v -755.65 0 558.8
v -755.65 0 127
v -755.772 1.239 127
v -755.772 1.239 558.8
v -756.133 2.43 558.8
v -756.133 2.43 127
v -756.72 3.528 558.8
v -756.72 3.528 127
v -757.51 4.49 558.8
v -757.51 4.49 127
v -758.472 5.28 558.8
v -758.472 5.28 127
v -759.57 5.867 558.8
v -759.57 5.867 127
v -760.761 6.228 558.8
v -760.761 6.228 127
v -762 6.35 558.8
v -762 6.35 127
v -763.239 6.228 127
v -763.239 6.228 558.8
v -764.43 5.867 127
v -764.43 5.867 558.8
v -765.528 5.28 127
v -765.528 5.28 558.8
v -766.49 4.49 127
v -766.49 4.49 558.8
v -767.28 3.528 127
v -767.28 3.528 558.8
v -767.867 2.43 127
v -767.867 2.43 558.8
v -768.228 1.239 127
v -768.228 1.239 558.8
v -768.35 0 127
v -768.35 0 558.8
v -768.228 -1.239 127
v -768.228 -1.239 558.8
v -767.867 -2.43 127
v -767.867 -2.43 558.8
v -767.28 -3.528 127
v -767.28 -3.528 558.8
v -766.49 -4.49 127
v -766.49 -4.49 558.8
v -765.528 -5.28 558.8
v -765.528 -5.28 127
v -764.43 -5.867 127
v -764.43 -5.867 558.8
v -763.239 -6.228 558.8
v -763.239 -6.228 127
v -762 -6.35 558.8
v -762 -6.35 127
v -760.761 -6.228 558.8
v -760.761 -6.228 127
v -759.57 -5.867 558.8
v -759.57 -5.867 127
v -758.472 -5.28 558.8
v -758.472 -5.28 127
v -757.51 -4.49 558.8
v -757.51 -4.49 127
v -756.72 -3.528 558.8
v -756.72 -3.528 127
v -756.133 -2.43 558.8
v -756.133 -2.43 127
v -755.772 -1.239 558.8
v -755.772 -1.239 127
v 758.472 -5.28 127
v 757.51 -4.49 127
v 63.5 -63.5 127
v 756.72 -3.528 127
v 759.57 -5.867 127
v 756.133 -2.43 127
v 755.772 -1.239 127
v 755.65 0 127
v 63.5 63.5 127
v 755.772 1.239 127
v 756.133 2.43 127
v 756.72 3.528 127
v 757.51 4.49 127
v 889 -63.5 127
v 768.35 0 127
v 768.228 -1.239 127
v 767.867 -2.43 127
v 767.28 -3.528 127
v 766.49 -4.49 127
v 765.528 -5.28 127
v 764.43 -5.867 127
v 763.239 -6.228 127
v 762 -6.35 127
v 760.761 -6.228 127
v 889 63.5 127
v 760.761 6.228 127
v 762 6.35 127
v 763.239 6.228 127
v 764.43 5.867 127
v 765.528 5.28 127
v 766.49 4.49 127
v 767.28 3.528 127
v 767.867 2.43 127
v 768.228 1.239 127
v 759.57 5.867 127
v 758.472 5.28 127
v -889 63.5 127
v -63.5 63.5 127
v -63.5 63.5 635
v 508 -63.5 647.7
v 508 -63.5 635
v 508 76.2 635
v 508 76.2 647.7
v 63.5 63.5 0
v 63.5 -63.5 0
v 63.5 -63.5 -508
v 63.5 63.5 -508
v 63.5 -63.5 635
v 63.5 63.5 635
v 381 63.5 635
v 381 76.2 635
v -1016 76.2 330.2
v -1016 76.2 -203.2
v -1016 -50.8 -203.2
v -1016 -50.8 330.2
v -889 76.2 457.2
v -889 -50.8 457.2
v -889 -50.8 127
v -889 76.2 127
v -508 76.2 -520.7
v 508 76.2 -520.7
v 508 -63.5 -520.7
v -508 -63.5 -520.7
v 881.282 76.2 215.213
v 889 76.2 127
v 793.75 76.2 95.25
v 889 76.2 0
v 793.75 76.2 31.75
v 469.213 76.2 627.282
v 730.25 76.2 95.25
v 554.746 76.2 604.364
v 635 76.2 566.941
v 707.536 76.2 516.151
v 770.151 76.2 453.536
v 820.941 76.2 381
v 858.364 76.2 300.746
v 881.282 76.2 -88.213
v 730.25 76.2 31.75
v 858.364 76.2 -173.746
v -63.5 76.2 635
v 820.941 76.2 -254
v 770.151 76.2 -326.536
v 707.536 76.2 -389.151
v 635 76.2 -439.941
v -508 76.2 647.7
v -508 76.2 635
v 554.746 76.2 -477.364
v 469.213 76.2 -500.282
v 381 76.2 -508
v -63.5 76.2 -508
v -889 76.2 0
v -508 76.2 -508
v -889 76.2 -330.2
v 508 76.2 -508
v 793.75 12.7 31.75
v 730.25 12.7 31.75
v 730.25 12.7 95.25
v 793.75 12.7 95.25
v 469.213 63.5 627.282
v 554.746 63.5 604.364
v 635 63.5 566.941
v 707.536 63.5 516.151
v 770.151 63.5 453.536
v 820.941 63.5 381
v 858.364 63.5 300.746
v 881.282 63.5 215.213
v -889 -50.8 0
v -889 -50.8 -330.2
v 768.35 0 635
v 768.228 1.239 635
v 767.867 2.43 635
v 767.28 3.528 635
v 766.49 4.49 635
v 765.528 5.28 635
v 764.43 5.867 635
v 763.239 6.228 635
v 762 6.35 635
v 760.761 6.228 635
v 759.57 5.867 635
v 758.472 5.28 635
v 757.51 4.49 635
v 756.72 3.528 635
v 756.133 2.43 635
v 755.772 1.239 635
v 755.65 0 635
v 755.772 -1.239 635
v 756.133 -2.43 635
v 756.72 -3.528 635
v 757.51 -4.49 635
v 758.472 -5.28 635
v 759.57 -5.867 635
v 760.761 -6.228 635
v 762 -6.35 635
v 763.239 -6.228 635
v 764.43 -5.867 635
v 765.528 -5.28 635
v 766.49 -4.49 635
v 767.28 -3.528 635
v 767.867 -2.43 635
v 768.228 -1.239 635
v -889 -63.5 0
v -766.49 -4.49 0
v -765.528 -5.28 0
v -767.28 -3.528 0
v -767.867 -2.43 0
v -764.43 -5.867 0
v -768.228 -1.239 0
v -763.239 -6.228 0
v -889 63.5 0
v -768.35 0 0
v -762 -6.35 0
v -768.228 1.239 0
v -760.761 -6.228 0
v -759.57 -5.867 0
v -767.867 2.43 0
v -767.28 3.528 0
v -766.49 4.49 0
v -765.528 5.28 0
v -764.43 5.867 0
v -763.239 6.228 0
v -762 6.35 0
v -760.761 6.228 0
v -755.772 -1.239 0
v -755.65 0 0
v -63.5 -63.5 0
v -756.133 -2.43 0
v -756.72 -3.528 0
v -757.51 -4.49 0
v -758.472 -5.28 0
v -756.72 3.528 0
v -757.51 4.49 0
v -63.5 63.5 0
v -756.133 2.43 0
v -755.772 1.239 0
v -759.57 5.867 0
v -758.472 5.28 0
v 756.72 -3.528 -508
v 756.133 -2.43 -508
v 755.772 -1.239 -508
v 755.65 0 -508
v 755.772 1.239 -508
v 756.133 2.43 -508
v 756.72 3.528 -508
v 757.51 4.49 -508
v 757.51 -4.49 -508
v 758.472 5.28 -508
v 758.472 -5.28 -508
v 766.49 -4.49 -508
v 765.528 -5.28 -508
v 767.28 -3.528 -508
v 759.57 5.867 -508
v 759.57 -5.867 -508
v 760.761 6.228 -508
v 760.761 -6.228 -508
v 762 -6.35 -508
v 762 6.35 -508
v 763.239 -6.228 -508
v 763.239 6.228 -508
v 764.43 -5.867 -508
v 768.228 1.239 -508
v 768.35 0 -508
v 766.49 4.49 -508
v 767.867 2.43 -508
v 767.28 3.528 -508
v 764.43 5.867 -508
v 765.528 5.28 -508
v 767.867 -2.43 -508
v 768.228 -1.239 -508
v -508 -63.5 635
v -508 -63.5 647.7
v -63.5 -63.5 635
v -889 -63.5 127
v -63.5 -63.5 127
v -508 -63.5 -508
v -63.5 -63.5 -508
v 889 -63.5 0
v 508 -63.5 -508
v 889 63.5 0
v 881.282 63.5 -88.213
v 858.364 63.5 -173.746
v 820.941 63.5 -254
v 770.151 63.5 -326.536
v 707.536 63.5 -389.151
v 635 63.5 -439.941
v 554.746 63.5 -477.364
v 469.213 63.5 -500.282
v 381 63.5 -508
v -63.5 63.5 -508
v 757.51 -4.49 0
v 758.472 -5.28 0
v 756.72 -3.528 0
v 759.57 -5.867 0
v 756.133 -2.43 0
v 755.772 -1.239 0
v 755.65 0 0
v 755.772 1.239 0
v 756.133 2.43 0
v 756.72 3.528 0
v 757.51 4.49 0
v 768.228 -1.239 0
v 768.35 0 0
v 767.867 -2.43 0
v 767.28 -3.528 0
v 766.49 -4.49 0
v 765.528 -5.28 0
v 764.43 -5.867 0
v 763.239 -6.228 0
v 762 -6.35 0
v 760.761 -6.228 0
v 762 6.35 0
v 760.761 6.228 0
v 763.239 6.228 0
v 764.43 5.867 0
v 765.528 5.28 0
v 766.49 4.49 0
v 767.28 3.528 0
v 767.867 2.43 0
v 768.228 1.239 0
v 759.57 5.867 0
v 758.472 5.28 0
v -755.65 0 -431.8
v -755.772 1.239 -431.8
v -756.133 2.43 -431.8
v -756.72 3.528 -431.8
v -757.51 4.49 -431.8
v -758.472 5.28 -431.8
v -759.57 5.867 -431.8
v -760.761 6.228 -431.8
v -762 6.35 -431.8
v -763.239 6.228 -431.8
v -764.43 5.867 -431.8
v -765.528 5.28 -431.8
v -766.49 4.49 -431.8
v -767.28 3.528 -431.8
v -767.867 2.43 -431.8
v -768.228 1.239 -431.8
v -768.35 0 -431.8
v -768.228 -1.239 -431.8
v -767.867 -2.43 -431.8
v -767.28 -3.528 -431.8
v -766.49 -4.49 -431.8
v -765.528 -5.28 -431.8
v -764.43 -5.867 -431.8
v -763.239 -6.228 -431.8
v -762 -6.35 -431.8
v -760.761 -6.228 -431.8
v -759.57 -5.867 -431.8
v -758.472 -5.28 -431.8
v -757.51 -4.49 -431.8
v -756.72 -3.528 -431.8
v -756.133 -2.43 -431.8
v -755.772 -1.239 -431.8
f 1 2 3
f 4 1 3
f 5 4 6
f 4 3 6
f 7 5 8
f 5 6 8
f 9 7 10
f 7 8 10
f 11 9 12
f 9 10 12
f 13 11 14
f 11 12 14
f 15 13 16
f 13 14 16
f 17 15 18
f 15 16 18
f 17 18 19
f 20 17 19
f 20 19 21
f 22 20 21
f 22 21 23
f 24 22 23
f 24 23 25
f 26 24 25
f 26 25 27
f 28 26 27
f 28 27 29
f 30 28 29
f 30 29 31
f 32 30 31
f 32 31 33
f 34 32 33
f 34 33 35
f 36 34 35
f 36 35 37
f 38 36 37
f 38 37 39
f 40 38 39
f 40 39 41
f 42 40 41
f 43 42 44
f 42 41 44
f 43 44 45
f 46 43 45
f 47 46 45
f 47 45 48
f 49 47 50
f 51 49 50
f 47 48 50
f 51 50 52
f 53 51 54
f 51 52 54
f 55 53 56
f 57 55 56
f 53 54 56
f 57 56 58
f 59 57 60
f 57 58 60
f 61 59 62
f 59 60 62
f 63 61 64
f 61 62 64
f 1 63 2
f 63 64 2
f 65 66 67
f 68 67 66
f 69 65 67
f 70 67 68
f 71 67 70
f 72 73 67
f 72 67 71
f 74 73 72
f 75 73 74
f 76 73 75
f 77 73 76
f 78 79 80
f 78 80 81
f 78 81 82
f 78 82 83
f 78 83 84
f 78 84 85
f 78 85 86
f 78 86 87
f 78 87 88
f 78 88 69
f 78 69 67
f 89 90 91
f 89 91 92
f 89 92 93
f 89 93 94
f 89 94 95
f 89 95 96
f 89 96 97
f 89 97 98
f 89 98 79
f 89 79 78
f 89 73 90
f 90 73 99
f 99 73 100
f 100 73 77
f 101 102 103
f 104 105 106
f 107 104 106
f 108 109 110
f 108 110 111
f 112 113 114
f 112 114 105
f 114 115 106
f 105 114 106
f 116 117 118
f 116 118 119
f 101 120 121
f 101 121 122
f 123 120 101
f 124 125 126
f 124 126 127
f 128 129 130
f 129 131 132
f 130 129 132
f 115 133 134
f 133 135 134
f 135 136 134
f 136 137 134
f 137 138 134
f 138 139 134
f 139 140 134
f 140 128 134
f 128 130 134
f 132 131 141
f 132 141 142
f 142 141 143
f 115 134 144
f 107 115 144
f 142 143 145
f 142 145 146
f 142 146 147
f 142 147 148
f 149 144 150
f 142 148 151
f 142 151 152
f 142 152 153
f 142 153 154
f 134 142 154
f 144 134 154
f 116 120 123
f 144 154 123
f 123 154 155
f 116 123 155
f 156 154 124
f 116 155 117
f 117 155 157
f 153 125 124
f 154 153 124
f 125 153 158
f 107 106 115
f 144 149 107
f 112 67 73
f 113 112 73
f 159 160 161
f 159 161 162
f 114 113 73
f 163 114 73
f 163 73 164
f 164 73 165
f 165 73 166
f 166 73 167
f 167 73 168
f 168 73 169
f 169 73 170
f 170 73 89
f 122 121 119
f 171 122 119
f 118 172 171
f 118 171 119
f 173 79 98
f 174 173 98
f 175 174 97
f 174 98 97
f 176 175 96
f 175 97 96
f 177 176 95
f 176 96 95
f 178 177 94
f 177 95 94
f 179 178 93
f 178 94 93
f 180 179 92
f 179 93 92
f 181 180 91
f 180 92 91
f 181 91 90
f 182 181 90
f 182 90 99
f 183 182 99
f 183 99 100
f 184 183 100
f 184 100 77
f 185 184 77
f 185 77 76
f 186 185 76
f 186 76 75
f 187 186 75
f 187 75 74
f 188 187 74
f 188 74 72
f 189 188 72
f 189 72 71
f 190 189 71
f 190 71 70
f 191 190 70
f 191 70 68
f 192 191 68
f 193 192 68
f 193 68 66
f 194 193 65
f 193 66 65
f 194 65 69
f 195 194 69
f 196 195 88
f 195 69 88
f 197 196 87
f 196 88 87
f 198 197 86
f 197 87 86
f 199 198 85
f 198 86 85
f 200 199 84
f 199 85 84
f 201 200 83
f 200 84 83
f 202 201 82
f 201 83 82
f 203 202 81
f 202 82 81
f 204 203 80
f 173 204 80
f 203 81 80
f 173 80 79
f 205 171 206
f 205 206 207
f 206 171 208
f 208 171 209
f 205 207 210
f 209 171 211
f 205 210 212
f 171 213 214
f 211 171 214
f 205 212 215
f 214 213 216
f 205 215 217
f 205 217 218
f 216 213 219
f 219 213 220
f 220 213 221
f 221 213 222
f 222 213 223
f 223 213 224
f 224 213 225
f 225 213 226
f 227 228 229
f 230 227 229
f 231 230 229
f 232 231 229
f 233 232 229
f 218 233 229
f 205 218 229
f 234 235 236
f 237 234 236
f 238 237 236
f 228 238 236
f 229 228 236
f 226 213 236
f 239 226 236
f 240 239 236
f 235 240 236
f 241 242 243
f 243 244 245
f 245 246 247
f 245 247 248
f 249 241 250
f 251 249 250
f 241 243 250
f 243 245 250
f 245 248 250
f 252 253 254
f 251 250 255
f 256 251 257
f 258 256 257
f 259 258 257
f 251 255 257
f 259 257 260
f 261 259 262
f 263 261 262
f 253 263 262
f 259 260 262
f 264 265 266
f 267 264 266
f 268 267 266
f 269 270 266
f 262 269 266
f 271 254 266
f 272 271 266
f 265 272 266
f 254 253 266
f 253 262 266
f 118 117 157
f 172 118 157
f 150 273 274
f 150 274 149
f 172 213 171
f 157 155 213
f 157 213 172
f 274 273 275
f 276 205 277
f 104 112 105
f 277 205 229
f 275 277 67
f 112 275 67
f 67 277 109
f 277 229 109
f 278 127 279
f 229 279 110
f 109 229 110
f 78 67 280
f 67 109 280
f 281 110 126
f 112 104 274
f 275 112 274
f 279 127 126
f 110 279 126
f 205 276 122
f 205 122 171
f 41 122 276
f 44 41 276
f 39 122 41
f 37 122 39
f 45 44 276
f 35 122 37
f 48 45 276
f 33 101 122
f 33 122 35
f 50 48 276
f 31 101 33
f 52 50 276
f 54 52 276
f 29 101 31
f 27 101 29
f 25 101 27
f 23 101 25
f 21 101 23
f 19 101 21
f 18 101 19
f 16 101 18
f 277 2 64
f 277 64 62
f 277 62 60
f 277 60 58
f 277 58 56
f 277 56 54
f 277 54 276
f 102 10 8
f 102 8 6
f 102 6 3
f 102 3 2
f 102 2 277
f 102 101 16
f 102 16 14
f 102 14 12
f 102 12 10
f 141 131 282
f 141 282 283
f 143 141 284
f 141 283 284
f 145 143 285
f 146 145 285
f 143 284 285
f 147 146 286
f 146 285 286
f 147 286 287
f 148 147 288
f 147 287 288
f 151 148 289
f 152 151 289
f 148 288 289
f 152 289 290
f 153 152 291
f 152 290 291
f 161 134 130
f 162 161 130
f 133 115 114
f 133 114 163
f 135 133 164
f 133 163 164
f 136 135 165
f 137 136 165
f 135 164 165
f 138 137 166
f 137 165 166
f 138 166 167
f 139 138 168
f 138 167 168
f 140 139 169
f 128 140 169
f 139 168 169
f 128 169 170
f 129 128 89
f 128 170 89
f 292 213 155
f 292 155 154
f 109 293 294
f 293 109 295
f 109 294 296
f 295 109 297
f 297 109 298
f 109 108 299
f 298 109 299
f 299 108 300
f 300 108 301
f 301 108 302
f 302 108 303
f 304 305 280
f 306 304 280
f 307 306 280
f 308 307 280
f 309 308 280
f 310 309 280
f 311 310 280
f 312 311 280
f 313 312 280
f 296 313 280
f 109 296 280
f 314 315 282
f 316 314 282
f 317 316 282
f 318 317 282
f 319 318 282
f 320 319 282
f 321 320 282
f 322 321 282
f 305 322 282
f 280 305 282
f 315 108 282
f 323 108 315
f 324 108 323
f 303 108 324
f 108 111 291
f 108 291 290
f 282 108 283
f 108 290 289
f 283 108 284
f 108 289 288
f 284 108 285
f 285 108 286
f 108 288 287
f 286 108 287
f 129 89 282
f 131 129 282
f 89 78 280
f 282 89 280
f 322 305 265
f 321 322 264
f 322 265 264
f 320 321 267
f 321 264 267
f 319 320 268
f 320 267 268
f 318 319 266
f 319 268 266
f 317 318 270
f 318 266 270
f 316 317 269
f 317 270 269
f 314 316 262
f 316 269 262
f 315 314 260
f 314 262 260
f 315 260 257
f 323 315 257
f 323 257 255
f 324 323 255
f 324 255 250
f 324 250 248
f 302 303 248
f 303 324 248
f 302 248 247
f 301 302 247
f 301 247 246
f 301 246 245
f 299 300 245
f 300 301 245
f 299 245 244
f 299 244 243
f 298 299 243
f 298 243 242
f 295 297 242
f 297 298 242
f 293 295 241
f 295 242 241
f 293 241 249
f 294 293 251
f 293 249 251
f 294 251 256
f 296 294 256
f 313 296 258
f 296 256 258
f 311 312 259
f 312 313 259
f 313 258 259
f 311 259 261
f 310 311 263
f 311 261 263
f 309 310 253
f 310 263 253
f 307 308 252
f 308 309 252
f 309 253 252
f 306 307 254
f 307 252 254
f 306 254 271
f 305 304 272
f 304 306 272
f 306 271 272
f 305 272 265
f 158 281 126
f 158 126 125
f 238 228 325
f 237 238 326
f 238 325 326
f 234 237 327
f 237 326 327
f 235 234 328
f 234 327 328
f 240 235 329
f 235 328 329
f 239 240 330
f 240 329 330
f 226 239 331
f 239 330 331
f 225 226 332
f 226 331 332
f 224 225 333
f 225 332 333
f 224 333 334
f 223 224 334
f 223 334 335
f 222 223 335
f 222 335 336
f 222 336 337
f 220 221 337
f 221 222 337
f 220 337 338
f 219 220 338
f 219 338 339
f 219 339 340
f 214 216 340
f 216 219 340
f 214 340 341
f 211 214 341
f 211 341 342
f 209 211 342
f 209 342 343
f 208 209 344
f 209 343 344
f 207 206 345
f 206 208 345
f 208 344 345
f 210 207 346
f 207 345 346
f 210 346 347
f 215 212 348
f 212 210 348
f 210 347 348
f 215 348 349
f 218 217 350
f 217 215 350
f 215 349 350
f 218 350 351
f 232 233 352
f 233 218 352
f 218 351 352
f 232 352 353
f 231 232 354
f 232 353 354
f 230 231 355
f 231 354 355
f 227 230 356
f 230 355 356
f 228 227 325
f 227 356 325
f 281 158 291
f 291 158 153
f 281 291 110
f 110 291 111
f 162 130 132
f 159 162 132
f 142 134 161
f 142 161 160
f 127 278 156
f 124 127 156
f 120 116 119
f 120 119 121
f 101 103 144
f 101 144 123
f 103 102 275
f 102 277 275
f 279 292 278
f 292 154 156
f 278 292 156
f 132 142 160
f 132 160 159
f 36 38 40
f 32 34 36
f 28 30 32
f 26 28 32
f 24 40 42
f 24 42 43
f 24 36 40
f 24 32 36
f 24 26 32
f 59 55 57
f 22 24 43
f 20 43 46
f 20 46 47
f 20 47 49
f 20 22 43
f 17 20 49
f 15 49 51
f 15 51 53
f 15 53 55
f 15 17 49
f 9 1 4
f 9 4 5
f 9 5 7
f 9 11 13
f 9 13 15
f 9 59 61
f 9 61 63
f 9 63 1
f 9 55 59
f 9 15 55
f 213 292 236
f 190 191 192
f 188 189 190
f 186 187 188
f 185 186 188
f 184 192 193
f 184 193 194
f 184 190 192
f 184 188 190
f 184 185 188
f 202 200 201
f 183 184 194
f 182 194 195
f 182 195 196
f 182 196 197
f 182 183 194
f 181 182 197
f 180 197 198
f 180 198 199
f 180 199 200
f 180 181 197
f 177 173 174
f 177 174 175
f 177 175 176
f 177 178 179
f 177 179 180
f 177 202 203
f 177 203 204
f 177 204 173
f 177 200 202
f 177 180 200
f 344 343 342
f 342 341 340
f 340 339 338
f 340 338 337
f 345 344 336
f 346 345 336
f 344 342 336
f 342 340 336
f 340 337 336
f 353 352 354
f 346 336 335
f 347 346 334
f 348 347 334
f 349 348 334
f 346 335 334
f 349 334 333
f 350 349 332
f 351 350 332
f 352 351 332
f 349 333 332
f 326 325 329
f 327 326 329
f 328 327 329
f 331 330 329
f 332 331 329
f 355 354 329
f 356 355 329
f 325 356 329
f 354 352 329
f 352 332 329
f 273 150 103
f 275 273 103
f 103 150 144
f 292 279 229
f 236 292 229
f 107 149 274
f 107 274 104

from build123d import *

# Parameters (mm, degrees)
SKETCH1_W                = 1778
SKETCH1_H                = 127
BOSS_EXTRUDE1_DEPTH      = 127
SKETCH2_W                = 127
SKETCH2_H                = 127
BOSS_EXTRUDE2_DEPTH      = 508
SKETCH3_W                = 127
SKETCH3_H                = 127
BOSS_EXTRUDE3_DEPTH      = 508
BOSS_EXTRUDE4_DEPTH      = 431.8
BOSS_EXTRUDE4_DEPTH_BACK = 558.8
SKETCH4_R                = 6.35
BOSS_EXTRUDE5_DEPTH      = 508
BOSS_EXTRUDE5_DEPTH_BACK = 635
SKETCH6_R                = 6.35
BOSS_EXTRUDE7_DEPTH      = 12.7
BOSS_EXTRUDE8_DEPTH      = 12.7
SKETCH11_W               = 1016
SKETCH11_H               = 139.7
BOSS_EXTRUDE9_DEPTH      = 12.7
SKETCH12_W               = 1016
SKETCH12_H               = 139.7
BOSS_EXTRUDE10_DEPTH     = 12.7
SKETCH13_W               = 127
SKETCH13_H               = 127
BOSS_EXTRUDE11_DEPTH     = 127
SKETCH15_W               = 63.5
SKETCH15_H               = 63.5
CUT_EXTRUDE1_DEPTH       = 63.5


with BuildPart() as part:
    # Sketch1 → Boss-Extrude1 (new body)
    with BuildSketch(Plane.XY):
        Rectangle(SKETCH1_W, SKETCH1_H)
    extrude(amount=BOSS_EXTRUDE1_DEPTH)

    # Sketch2 → Boss-Extrude2 (add)
    with BuildSketch(Plane.XY.offset(127)):
        Rectangle(SKETCH2_W, SKETCH2_H)
    extrude(amount=BOSS_EXTRUDE2_DEPTH)

    # Sketch3 → Boss-Extrude3 (add)
    with BuildSketch(Plane(origin=(0, 0, 0), x_dir=(-1, 0, 0), z_dir=(0, 0, -1))):
        Rectangle(SKETCH3_W, SKETCH3_H)
    extrude(amount=BOSS_EXTRUDE3_DEPTH)

    # Sketch4 → Boss-Extrude4 (add, two sides: drawn at the far end of the back side and taken through both)
    with BuildSketch(Plane.XY.offset(127).offset(-BOSS_EXTRUDE4_DEPTH_BACK)):
        with Locations((-762, 0)):
            Circle(SKETCH4_R)
    extrude(amount=BOSS_EXTRUDE4_DEPTH + BOSS_EXTRUDE4_DEPTH_BACK)

    # Sketch6 → Boss-Extrude5 (add, two sides: drawn at the far end of the back side and taken through both)
    with BuildSketch(Plane.XY.offset(127).offset(-BOSS_EXTRUDE5_DEPTH_BACK)):
        with Locations((762, 0)):
            Circle(SKETCH6_R)
    extrude(amount=BOSS_EXTRUDE5_DEPTH + BOSS_EXTRUDE5_DEPTH_BACK)

    # Sketch9 → Boss-Extrude7 (add)
    with BuildSketch(Plane(origin=(0, 63.5, 0), x_dir=(1, 0, 0), z_dir=(0, 1, 0))):
        with BuildLine():
            Line((-63.5, 508), (-63.5, -635))
            Line((-63.5, -635), (381, -635))
            ThreePointArc((381, -635), (740.210244843, -486.210244843), (889, -127))
            Line((889, -127), (889, 0))
            ThreePointArc((889, 0), (740.210244843, 359.210244843), (381, 508))
            Line((381, 508), (-63.5, 508))
        make_face()
    extrude(amount=BOSS_EXTRUDE7_DEPTH)

    # Sketch10 → Boss-Extrude8 (add)
    with BuildSketch(Plane(origin=(0, 63.5, 0), x_dir=(1, 0, 0), z_dir=(0, 1, 0))):
        with BuildLine():
            Line((-63.5, -635), (-889, -127))
            Line((-889, -127), (-889, 0))
            Line((-889, 0), (-63.5, 508))
            Line((-63.5, 508), (381, 508))
            ThreePointArc((381, 508), (740.210244843, 359.210244843), (889, 0))
            Line((889, 0), (889, -127))
            ThreePointArc((889, -127), (740.210244843, -486.210244843), (381, -635))
            Line((381, -635), (-63.5, -635))
        make_face()
    extrude(amount=BOSS_EXTRUDE8_DEPTH)

    # Sketch11 → Boss-Extrude9 (add)
    with BuildSketch(Plane(origin=(0, 0, -508), x_dir=(-1, 0, 0), z_dir=(0, 0, -1))):
        with Locations((0, 6.35)):
            Rectangle(SKETCH11_W, SKETCH11_H)
    extrude(amount=BOSS_EXTRUDE9_DEPTH)

    # Sketch12 → Boss-Extrude10 (add)
    with BuildSketch(Plane.XY.offset(635)):
        with Locations((0, 6.35)):
            Rectangle(SKETCH12_W, SKETCH12_H)
    extrude(amount=BOSS_EXTRUDE10_DEPTH)

    # Sketch13 → Boss-Extrude11 (add)
    with BuildSketch(Plane(origin=(0, 76.2, 0), x_dir=(1, 0, 0), z_dir=(0, 1, 0))):
        Polygon((-889, 330.2), (-889, 0), (-1016, 0), (-1016, 203.2), align=None)
        Polygon((-1016, -330.2), (-889, -457.2), (-889, -127), (-1016, -127), align=None)
        with Locations((-952.5, -63.5)):
            Rectangle(SKETCH13_W, SKETCH13_H)
    extrude(amount=-BOSS_EXTRUDE11_DEPTH)

    # Sketch15 → Cut-Extrude1 (cut)
    with BuildSketch(Plane(origin=(0, 76.2, 0), x_dir=(1, 0, 0), z_dir=(0, 1, 0))):
        with Locations((762, -63.5)):
            Rectangle(SKETCH15_W, SKETCH15_H)
    extrude(amount=-CUT_EXTRUDE1_DEPTH, mode=Mode.SUBTRACT)


solid = part.part
